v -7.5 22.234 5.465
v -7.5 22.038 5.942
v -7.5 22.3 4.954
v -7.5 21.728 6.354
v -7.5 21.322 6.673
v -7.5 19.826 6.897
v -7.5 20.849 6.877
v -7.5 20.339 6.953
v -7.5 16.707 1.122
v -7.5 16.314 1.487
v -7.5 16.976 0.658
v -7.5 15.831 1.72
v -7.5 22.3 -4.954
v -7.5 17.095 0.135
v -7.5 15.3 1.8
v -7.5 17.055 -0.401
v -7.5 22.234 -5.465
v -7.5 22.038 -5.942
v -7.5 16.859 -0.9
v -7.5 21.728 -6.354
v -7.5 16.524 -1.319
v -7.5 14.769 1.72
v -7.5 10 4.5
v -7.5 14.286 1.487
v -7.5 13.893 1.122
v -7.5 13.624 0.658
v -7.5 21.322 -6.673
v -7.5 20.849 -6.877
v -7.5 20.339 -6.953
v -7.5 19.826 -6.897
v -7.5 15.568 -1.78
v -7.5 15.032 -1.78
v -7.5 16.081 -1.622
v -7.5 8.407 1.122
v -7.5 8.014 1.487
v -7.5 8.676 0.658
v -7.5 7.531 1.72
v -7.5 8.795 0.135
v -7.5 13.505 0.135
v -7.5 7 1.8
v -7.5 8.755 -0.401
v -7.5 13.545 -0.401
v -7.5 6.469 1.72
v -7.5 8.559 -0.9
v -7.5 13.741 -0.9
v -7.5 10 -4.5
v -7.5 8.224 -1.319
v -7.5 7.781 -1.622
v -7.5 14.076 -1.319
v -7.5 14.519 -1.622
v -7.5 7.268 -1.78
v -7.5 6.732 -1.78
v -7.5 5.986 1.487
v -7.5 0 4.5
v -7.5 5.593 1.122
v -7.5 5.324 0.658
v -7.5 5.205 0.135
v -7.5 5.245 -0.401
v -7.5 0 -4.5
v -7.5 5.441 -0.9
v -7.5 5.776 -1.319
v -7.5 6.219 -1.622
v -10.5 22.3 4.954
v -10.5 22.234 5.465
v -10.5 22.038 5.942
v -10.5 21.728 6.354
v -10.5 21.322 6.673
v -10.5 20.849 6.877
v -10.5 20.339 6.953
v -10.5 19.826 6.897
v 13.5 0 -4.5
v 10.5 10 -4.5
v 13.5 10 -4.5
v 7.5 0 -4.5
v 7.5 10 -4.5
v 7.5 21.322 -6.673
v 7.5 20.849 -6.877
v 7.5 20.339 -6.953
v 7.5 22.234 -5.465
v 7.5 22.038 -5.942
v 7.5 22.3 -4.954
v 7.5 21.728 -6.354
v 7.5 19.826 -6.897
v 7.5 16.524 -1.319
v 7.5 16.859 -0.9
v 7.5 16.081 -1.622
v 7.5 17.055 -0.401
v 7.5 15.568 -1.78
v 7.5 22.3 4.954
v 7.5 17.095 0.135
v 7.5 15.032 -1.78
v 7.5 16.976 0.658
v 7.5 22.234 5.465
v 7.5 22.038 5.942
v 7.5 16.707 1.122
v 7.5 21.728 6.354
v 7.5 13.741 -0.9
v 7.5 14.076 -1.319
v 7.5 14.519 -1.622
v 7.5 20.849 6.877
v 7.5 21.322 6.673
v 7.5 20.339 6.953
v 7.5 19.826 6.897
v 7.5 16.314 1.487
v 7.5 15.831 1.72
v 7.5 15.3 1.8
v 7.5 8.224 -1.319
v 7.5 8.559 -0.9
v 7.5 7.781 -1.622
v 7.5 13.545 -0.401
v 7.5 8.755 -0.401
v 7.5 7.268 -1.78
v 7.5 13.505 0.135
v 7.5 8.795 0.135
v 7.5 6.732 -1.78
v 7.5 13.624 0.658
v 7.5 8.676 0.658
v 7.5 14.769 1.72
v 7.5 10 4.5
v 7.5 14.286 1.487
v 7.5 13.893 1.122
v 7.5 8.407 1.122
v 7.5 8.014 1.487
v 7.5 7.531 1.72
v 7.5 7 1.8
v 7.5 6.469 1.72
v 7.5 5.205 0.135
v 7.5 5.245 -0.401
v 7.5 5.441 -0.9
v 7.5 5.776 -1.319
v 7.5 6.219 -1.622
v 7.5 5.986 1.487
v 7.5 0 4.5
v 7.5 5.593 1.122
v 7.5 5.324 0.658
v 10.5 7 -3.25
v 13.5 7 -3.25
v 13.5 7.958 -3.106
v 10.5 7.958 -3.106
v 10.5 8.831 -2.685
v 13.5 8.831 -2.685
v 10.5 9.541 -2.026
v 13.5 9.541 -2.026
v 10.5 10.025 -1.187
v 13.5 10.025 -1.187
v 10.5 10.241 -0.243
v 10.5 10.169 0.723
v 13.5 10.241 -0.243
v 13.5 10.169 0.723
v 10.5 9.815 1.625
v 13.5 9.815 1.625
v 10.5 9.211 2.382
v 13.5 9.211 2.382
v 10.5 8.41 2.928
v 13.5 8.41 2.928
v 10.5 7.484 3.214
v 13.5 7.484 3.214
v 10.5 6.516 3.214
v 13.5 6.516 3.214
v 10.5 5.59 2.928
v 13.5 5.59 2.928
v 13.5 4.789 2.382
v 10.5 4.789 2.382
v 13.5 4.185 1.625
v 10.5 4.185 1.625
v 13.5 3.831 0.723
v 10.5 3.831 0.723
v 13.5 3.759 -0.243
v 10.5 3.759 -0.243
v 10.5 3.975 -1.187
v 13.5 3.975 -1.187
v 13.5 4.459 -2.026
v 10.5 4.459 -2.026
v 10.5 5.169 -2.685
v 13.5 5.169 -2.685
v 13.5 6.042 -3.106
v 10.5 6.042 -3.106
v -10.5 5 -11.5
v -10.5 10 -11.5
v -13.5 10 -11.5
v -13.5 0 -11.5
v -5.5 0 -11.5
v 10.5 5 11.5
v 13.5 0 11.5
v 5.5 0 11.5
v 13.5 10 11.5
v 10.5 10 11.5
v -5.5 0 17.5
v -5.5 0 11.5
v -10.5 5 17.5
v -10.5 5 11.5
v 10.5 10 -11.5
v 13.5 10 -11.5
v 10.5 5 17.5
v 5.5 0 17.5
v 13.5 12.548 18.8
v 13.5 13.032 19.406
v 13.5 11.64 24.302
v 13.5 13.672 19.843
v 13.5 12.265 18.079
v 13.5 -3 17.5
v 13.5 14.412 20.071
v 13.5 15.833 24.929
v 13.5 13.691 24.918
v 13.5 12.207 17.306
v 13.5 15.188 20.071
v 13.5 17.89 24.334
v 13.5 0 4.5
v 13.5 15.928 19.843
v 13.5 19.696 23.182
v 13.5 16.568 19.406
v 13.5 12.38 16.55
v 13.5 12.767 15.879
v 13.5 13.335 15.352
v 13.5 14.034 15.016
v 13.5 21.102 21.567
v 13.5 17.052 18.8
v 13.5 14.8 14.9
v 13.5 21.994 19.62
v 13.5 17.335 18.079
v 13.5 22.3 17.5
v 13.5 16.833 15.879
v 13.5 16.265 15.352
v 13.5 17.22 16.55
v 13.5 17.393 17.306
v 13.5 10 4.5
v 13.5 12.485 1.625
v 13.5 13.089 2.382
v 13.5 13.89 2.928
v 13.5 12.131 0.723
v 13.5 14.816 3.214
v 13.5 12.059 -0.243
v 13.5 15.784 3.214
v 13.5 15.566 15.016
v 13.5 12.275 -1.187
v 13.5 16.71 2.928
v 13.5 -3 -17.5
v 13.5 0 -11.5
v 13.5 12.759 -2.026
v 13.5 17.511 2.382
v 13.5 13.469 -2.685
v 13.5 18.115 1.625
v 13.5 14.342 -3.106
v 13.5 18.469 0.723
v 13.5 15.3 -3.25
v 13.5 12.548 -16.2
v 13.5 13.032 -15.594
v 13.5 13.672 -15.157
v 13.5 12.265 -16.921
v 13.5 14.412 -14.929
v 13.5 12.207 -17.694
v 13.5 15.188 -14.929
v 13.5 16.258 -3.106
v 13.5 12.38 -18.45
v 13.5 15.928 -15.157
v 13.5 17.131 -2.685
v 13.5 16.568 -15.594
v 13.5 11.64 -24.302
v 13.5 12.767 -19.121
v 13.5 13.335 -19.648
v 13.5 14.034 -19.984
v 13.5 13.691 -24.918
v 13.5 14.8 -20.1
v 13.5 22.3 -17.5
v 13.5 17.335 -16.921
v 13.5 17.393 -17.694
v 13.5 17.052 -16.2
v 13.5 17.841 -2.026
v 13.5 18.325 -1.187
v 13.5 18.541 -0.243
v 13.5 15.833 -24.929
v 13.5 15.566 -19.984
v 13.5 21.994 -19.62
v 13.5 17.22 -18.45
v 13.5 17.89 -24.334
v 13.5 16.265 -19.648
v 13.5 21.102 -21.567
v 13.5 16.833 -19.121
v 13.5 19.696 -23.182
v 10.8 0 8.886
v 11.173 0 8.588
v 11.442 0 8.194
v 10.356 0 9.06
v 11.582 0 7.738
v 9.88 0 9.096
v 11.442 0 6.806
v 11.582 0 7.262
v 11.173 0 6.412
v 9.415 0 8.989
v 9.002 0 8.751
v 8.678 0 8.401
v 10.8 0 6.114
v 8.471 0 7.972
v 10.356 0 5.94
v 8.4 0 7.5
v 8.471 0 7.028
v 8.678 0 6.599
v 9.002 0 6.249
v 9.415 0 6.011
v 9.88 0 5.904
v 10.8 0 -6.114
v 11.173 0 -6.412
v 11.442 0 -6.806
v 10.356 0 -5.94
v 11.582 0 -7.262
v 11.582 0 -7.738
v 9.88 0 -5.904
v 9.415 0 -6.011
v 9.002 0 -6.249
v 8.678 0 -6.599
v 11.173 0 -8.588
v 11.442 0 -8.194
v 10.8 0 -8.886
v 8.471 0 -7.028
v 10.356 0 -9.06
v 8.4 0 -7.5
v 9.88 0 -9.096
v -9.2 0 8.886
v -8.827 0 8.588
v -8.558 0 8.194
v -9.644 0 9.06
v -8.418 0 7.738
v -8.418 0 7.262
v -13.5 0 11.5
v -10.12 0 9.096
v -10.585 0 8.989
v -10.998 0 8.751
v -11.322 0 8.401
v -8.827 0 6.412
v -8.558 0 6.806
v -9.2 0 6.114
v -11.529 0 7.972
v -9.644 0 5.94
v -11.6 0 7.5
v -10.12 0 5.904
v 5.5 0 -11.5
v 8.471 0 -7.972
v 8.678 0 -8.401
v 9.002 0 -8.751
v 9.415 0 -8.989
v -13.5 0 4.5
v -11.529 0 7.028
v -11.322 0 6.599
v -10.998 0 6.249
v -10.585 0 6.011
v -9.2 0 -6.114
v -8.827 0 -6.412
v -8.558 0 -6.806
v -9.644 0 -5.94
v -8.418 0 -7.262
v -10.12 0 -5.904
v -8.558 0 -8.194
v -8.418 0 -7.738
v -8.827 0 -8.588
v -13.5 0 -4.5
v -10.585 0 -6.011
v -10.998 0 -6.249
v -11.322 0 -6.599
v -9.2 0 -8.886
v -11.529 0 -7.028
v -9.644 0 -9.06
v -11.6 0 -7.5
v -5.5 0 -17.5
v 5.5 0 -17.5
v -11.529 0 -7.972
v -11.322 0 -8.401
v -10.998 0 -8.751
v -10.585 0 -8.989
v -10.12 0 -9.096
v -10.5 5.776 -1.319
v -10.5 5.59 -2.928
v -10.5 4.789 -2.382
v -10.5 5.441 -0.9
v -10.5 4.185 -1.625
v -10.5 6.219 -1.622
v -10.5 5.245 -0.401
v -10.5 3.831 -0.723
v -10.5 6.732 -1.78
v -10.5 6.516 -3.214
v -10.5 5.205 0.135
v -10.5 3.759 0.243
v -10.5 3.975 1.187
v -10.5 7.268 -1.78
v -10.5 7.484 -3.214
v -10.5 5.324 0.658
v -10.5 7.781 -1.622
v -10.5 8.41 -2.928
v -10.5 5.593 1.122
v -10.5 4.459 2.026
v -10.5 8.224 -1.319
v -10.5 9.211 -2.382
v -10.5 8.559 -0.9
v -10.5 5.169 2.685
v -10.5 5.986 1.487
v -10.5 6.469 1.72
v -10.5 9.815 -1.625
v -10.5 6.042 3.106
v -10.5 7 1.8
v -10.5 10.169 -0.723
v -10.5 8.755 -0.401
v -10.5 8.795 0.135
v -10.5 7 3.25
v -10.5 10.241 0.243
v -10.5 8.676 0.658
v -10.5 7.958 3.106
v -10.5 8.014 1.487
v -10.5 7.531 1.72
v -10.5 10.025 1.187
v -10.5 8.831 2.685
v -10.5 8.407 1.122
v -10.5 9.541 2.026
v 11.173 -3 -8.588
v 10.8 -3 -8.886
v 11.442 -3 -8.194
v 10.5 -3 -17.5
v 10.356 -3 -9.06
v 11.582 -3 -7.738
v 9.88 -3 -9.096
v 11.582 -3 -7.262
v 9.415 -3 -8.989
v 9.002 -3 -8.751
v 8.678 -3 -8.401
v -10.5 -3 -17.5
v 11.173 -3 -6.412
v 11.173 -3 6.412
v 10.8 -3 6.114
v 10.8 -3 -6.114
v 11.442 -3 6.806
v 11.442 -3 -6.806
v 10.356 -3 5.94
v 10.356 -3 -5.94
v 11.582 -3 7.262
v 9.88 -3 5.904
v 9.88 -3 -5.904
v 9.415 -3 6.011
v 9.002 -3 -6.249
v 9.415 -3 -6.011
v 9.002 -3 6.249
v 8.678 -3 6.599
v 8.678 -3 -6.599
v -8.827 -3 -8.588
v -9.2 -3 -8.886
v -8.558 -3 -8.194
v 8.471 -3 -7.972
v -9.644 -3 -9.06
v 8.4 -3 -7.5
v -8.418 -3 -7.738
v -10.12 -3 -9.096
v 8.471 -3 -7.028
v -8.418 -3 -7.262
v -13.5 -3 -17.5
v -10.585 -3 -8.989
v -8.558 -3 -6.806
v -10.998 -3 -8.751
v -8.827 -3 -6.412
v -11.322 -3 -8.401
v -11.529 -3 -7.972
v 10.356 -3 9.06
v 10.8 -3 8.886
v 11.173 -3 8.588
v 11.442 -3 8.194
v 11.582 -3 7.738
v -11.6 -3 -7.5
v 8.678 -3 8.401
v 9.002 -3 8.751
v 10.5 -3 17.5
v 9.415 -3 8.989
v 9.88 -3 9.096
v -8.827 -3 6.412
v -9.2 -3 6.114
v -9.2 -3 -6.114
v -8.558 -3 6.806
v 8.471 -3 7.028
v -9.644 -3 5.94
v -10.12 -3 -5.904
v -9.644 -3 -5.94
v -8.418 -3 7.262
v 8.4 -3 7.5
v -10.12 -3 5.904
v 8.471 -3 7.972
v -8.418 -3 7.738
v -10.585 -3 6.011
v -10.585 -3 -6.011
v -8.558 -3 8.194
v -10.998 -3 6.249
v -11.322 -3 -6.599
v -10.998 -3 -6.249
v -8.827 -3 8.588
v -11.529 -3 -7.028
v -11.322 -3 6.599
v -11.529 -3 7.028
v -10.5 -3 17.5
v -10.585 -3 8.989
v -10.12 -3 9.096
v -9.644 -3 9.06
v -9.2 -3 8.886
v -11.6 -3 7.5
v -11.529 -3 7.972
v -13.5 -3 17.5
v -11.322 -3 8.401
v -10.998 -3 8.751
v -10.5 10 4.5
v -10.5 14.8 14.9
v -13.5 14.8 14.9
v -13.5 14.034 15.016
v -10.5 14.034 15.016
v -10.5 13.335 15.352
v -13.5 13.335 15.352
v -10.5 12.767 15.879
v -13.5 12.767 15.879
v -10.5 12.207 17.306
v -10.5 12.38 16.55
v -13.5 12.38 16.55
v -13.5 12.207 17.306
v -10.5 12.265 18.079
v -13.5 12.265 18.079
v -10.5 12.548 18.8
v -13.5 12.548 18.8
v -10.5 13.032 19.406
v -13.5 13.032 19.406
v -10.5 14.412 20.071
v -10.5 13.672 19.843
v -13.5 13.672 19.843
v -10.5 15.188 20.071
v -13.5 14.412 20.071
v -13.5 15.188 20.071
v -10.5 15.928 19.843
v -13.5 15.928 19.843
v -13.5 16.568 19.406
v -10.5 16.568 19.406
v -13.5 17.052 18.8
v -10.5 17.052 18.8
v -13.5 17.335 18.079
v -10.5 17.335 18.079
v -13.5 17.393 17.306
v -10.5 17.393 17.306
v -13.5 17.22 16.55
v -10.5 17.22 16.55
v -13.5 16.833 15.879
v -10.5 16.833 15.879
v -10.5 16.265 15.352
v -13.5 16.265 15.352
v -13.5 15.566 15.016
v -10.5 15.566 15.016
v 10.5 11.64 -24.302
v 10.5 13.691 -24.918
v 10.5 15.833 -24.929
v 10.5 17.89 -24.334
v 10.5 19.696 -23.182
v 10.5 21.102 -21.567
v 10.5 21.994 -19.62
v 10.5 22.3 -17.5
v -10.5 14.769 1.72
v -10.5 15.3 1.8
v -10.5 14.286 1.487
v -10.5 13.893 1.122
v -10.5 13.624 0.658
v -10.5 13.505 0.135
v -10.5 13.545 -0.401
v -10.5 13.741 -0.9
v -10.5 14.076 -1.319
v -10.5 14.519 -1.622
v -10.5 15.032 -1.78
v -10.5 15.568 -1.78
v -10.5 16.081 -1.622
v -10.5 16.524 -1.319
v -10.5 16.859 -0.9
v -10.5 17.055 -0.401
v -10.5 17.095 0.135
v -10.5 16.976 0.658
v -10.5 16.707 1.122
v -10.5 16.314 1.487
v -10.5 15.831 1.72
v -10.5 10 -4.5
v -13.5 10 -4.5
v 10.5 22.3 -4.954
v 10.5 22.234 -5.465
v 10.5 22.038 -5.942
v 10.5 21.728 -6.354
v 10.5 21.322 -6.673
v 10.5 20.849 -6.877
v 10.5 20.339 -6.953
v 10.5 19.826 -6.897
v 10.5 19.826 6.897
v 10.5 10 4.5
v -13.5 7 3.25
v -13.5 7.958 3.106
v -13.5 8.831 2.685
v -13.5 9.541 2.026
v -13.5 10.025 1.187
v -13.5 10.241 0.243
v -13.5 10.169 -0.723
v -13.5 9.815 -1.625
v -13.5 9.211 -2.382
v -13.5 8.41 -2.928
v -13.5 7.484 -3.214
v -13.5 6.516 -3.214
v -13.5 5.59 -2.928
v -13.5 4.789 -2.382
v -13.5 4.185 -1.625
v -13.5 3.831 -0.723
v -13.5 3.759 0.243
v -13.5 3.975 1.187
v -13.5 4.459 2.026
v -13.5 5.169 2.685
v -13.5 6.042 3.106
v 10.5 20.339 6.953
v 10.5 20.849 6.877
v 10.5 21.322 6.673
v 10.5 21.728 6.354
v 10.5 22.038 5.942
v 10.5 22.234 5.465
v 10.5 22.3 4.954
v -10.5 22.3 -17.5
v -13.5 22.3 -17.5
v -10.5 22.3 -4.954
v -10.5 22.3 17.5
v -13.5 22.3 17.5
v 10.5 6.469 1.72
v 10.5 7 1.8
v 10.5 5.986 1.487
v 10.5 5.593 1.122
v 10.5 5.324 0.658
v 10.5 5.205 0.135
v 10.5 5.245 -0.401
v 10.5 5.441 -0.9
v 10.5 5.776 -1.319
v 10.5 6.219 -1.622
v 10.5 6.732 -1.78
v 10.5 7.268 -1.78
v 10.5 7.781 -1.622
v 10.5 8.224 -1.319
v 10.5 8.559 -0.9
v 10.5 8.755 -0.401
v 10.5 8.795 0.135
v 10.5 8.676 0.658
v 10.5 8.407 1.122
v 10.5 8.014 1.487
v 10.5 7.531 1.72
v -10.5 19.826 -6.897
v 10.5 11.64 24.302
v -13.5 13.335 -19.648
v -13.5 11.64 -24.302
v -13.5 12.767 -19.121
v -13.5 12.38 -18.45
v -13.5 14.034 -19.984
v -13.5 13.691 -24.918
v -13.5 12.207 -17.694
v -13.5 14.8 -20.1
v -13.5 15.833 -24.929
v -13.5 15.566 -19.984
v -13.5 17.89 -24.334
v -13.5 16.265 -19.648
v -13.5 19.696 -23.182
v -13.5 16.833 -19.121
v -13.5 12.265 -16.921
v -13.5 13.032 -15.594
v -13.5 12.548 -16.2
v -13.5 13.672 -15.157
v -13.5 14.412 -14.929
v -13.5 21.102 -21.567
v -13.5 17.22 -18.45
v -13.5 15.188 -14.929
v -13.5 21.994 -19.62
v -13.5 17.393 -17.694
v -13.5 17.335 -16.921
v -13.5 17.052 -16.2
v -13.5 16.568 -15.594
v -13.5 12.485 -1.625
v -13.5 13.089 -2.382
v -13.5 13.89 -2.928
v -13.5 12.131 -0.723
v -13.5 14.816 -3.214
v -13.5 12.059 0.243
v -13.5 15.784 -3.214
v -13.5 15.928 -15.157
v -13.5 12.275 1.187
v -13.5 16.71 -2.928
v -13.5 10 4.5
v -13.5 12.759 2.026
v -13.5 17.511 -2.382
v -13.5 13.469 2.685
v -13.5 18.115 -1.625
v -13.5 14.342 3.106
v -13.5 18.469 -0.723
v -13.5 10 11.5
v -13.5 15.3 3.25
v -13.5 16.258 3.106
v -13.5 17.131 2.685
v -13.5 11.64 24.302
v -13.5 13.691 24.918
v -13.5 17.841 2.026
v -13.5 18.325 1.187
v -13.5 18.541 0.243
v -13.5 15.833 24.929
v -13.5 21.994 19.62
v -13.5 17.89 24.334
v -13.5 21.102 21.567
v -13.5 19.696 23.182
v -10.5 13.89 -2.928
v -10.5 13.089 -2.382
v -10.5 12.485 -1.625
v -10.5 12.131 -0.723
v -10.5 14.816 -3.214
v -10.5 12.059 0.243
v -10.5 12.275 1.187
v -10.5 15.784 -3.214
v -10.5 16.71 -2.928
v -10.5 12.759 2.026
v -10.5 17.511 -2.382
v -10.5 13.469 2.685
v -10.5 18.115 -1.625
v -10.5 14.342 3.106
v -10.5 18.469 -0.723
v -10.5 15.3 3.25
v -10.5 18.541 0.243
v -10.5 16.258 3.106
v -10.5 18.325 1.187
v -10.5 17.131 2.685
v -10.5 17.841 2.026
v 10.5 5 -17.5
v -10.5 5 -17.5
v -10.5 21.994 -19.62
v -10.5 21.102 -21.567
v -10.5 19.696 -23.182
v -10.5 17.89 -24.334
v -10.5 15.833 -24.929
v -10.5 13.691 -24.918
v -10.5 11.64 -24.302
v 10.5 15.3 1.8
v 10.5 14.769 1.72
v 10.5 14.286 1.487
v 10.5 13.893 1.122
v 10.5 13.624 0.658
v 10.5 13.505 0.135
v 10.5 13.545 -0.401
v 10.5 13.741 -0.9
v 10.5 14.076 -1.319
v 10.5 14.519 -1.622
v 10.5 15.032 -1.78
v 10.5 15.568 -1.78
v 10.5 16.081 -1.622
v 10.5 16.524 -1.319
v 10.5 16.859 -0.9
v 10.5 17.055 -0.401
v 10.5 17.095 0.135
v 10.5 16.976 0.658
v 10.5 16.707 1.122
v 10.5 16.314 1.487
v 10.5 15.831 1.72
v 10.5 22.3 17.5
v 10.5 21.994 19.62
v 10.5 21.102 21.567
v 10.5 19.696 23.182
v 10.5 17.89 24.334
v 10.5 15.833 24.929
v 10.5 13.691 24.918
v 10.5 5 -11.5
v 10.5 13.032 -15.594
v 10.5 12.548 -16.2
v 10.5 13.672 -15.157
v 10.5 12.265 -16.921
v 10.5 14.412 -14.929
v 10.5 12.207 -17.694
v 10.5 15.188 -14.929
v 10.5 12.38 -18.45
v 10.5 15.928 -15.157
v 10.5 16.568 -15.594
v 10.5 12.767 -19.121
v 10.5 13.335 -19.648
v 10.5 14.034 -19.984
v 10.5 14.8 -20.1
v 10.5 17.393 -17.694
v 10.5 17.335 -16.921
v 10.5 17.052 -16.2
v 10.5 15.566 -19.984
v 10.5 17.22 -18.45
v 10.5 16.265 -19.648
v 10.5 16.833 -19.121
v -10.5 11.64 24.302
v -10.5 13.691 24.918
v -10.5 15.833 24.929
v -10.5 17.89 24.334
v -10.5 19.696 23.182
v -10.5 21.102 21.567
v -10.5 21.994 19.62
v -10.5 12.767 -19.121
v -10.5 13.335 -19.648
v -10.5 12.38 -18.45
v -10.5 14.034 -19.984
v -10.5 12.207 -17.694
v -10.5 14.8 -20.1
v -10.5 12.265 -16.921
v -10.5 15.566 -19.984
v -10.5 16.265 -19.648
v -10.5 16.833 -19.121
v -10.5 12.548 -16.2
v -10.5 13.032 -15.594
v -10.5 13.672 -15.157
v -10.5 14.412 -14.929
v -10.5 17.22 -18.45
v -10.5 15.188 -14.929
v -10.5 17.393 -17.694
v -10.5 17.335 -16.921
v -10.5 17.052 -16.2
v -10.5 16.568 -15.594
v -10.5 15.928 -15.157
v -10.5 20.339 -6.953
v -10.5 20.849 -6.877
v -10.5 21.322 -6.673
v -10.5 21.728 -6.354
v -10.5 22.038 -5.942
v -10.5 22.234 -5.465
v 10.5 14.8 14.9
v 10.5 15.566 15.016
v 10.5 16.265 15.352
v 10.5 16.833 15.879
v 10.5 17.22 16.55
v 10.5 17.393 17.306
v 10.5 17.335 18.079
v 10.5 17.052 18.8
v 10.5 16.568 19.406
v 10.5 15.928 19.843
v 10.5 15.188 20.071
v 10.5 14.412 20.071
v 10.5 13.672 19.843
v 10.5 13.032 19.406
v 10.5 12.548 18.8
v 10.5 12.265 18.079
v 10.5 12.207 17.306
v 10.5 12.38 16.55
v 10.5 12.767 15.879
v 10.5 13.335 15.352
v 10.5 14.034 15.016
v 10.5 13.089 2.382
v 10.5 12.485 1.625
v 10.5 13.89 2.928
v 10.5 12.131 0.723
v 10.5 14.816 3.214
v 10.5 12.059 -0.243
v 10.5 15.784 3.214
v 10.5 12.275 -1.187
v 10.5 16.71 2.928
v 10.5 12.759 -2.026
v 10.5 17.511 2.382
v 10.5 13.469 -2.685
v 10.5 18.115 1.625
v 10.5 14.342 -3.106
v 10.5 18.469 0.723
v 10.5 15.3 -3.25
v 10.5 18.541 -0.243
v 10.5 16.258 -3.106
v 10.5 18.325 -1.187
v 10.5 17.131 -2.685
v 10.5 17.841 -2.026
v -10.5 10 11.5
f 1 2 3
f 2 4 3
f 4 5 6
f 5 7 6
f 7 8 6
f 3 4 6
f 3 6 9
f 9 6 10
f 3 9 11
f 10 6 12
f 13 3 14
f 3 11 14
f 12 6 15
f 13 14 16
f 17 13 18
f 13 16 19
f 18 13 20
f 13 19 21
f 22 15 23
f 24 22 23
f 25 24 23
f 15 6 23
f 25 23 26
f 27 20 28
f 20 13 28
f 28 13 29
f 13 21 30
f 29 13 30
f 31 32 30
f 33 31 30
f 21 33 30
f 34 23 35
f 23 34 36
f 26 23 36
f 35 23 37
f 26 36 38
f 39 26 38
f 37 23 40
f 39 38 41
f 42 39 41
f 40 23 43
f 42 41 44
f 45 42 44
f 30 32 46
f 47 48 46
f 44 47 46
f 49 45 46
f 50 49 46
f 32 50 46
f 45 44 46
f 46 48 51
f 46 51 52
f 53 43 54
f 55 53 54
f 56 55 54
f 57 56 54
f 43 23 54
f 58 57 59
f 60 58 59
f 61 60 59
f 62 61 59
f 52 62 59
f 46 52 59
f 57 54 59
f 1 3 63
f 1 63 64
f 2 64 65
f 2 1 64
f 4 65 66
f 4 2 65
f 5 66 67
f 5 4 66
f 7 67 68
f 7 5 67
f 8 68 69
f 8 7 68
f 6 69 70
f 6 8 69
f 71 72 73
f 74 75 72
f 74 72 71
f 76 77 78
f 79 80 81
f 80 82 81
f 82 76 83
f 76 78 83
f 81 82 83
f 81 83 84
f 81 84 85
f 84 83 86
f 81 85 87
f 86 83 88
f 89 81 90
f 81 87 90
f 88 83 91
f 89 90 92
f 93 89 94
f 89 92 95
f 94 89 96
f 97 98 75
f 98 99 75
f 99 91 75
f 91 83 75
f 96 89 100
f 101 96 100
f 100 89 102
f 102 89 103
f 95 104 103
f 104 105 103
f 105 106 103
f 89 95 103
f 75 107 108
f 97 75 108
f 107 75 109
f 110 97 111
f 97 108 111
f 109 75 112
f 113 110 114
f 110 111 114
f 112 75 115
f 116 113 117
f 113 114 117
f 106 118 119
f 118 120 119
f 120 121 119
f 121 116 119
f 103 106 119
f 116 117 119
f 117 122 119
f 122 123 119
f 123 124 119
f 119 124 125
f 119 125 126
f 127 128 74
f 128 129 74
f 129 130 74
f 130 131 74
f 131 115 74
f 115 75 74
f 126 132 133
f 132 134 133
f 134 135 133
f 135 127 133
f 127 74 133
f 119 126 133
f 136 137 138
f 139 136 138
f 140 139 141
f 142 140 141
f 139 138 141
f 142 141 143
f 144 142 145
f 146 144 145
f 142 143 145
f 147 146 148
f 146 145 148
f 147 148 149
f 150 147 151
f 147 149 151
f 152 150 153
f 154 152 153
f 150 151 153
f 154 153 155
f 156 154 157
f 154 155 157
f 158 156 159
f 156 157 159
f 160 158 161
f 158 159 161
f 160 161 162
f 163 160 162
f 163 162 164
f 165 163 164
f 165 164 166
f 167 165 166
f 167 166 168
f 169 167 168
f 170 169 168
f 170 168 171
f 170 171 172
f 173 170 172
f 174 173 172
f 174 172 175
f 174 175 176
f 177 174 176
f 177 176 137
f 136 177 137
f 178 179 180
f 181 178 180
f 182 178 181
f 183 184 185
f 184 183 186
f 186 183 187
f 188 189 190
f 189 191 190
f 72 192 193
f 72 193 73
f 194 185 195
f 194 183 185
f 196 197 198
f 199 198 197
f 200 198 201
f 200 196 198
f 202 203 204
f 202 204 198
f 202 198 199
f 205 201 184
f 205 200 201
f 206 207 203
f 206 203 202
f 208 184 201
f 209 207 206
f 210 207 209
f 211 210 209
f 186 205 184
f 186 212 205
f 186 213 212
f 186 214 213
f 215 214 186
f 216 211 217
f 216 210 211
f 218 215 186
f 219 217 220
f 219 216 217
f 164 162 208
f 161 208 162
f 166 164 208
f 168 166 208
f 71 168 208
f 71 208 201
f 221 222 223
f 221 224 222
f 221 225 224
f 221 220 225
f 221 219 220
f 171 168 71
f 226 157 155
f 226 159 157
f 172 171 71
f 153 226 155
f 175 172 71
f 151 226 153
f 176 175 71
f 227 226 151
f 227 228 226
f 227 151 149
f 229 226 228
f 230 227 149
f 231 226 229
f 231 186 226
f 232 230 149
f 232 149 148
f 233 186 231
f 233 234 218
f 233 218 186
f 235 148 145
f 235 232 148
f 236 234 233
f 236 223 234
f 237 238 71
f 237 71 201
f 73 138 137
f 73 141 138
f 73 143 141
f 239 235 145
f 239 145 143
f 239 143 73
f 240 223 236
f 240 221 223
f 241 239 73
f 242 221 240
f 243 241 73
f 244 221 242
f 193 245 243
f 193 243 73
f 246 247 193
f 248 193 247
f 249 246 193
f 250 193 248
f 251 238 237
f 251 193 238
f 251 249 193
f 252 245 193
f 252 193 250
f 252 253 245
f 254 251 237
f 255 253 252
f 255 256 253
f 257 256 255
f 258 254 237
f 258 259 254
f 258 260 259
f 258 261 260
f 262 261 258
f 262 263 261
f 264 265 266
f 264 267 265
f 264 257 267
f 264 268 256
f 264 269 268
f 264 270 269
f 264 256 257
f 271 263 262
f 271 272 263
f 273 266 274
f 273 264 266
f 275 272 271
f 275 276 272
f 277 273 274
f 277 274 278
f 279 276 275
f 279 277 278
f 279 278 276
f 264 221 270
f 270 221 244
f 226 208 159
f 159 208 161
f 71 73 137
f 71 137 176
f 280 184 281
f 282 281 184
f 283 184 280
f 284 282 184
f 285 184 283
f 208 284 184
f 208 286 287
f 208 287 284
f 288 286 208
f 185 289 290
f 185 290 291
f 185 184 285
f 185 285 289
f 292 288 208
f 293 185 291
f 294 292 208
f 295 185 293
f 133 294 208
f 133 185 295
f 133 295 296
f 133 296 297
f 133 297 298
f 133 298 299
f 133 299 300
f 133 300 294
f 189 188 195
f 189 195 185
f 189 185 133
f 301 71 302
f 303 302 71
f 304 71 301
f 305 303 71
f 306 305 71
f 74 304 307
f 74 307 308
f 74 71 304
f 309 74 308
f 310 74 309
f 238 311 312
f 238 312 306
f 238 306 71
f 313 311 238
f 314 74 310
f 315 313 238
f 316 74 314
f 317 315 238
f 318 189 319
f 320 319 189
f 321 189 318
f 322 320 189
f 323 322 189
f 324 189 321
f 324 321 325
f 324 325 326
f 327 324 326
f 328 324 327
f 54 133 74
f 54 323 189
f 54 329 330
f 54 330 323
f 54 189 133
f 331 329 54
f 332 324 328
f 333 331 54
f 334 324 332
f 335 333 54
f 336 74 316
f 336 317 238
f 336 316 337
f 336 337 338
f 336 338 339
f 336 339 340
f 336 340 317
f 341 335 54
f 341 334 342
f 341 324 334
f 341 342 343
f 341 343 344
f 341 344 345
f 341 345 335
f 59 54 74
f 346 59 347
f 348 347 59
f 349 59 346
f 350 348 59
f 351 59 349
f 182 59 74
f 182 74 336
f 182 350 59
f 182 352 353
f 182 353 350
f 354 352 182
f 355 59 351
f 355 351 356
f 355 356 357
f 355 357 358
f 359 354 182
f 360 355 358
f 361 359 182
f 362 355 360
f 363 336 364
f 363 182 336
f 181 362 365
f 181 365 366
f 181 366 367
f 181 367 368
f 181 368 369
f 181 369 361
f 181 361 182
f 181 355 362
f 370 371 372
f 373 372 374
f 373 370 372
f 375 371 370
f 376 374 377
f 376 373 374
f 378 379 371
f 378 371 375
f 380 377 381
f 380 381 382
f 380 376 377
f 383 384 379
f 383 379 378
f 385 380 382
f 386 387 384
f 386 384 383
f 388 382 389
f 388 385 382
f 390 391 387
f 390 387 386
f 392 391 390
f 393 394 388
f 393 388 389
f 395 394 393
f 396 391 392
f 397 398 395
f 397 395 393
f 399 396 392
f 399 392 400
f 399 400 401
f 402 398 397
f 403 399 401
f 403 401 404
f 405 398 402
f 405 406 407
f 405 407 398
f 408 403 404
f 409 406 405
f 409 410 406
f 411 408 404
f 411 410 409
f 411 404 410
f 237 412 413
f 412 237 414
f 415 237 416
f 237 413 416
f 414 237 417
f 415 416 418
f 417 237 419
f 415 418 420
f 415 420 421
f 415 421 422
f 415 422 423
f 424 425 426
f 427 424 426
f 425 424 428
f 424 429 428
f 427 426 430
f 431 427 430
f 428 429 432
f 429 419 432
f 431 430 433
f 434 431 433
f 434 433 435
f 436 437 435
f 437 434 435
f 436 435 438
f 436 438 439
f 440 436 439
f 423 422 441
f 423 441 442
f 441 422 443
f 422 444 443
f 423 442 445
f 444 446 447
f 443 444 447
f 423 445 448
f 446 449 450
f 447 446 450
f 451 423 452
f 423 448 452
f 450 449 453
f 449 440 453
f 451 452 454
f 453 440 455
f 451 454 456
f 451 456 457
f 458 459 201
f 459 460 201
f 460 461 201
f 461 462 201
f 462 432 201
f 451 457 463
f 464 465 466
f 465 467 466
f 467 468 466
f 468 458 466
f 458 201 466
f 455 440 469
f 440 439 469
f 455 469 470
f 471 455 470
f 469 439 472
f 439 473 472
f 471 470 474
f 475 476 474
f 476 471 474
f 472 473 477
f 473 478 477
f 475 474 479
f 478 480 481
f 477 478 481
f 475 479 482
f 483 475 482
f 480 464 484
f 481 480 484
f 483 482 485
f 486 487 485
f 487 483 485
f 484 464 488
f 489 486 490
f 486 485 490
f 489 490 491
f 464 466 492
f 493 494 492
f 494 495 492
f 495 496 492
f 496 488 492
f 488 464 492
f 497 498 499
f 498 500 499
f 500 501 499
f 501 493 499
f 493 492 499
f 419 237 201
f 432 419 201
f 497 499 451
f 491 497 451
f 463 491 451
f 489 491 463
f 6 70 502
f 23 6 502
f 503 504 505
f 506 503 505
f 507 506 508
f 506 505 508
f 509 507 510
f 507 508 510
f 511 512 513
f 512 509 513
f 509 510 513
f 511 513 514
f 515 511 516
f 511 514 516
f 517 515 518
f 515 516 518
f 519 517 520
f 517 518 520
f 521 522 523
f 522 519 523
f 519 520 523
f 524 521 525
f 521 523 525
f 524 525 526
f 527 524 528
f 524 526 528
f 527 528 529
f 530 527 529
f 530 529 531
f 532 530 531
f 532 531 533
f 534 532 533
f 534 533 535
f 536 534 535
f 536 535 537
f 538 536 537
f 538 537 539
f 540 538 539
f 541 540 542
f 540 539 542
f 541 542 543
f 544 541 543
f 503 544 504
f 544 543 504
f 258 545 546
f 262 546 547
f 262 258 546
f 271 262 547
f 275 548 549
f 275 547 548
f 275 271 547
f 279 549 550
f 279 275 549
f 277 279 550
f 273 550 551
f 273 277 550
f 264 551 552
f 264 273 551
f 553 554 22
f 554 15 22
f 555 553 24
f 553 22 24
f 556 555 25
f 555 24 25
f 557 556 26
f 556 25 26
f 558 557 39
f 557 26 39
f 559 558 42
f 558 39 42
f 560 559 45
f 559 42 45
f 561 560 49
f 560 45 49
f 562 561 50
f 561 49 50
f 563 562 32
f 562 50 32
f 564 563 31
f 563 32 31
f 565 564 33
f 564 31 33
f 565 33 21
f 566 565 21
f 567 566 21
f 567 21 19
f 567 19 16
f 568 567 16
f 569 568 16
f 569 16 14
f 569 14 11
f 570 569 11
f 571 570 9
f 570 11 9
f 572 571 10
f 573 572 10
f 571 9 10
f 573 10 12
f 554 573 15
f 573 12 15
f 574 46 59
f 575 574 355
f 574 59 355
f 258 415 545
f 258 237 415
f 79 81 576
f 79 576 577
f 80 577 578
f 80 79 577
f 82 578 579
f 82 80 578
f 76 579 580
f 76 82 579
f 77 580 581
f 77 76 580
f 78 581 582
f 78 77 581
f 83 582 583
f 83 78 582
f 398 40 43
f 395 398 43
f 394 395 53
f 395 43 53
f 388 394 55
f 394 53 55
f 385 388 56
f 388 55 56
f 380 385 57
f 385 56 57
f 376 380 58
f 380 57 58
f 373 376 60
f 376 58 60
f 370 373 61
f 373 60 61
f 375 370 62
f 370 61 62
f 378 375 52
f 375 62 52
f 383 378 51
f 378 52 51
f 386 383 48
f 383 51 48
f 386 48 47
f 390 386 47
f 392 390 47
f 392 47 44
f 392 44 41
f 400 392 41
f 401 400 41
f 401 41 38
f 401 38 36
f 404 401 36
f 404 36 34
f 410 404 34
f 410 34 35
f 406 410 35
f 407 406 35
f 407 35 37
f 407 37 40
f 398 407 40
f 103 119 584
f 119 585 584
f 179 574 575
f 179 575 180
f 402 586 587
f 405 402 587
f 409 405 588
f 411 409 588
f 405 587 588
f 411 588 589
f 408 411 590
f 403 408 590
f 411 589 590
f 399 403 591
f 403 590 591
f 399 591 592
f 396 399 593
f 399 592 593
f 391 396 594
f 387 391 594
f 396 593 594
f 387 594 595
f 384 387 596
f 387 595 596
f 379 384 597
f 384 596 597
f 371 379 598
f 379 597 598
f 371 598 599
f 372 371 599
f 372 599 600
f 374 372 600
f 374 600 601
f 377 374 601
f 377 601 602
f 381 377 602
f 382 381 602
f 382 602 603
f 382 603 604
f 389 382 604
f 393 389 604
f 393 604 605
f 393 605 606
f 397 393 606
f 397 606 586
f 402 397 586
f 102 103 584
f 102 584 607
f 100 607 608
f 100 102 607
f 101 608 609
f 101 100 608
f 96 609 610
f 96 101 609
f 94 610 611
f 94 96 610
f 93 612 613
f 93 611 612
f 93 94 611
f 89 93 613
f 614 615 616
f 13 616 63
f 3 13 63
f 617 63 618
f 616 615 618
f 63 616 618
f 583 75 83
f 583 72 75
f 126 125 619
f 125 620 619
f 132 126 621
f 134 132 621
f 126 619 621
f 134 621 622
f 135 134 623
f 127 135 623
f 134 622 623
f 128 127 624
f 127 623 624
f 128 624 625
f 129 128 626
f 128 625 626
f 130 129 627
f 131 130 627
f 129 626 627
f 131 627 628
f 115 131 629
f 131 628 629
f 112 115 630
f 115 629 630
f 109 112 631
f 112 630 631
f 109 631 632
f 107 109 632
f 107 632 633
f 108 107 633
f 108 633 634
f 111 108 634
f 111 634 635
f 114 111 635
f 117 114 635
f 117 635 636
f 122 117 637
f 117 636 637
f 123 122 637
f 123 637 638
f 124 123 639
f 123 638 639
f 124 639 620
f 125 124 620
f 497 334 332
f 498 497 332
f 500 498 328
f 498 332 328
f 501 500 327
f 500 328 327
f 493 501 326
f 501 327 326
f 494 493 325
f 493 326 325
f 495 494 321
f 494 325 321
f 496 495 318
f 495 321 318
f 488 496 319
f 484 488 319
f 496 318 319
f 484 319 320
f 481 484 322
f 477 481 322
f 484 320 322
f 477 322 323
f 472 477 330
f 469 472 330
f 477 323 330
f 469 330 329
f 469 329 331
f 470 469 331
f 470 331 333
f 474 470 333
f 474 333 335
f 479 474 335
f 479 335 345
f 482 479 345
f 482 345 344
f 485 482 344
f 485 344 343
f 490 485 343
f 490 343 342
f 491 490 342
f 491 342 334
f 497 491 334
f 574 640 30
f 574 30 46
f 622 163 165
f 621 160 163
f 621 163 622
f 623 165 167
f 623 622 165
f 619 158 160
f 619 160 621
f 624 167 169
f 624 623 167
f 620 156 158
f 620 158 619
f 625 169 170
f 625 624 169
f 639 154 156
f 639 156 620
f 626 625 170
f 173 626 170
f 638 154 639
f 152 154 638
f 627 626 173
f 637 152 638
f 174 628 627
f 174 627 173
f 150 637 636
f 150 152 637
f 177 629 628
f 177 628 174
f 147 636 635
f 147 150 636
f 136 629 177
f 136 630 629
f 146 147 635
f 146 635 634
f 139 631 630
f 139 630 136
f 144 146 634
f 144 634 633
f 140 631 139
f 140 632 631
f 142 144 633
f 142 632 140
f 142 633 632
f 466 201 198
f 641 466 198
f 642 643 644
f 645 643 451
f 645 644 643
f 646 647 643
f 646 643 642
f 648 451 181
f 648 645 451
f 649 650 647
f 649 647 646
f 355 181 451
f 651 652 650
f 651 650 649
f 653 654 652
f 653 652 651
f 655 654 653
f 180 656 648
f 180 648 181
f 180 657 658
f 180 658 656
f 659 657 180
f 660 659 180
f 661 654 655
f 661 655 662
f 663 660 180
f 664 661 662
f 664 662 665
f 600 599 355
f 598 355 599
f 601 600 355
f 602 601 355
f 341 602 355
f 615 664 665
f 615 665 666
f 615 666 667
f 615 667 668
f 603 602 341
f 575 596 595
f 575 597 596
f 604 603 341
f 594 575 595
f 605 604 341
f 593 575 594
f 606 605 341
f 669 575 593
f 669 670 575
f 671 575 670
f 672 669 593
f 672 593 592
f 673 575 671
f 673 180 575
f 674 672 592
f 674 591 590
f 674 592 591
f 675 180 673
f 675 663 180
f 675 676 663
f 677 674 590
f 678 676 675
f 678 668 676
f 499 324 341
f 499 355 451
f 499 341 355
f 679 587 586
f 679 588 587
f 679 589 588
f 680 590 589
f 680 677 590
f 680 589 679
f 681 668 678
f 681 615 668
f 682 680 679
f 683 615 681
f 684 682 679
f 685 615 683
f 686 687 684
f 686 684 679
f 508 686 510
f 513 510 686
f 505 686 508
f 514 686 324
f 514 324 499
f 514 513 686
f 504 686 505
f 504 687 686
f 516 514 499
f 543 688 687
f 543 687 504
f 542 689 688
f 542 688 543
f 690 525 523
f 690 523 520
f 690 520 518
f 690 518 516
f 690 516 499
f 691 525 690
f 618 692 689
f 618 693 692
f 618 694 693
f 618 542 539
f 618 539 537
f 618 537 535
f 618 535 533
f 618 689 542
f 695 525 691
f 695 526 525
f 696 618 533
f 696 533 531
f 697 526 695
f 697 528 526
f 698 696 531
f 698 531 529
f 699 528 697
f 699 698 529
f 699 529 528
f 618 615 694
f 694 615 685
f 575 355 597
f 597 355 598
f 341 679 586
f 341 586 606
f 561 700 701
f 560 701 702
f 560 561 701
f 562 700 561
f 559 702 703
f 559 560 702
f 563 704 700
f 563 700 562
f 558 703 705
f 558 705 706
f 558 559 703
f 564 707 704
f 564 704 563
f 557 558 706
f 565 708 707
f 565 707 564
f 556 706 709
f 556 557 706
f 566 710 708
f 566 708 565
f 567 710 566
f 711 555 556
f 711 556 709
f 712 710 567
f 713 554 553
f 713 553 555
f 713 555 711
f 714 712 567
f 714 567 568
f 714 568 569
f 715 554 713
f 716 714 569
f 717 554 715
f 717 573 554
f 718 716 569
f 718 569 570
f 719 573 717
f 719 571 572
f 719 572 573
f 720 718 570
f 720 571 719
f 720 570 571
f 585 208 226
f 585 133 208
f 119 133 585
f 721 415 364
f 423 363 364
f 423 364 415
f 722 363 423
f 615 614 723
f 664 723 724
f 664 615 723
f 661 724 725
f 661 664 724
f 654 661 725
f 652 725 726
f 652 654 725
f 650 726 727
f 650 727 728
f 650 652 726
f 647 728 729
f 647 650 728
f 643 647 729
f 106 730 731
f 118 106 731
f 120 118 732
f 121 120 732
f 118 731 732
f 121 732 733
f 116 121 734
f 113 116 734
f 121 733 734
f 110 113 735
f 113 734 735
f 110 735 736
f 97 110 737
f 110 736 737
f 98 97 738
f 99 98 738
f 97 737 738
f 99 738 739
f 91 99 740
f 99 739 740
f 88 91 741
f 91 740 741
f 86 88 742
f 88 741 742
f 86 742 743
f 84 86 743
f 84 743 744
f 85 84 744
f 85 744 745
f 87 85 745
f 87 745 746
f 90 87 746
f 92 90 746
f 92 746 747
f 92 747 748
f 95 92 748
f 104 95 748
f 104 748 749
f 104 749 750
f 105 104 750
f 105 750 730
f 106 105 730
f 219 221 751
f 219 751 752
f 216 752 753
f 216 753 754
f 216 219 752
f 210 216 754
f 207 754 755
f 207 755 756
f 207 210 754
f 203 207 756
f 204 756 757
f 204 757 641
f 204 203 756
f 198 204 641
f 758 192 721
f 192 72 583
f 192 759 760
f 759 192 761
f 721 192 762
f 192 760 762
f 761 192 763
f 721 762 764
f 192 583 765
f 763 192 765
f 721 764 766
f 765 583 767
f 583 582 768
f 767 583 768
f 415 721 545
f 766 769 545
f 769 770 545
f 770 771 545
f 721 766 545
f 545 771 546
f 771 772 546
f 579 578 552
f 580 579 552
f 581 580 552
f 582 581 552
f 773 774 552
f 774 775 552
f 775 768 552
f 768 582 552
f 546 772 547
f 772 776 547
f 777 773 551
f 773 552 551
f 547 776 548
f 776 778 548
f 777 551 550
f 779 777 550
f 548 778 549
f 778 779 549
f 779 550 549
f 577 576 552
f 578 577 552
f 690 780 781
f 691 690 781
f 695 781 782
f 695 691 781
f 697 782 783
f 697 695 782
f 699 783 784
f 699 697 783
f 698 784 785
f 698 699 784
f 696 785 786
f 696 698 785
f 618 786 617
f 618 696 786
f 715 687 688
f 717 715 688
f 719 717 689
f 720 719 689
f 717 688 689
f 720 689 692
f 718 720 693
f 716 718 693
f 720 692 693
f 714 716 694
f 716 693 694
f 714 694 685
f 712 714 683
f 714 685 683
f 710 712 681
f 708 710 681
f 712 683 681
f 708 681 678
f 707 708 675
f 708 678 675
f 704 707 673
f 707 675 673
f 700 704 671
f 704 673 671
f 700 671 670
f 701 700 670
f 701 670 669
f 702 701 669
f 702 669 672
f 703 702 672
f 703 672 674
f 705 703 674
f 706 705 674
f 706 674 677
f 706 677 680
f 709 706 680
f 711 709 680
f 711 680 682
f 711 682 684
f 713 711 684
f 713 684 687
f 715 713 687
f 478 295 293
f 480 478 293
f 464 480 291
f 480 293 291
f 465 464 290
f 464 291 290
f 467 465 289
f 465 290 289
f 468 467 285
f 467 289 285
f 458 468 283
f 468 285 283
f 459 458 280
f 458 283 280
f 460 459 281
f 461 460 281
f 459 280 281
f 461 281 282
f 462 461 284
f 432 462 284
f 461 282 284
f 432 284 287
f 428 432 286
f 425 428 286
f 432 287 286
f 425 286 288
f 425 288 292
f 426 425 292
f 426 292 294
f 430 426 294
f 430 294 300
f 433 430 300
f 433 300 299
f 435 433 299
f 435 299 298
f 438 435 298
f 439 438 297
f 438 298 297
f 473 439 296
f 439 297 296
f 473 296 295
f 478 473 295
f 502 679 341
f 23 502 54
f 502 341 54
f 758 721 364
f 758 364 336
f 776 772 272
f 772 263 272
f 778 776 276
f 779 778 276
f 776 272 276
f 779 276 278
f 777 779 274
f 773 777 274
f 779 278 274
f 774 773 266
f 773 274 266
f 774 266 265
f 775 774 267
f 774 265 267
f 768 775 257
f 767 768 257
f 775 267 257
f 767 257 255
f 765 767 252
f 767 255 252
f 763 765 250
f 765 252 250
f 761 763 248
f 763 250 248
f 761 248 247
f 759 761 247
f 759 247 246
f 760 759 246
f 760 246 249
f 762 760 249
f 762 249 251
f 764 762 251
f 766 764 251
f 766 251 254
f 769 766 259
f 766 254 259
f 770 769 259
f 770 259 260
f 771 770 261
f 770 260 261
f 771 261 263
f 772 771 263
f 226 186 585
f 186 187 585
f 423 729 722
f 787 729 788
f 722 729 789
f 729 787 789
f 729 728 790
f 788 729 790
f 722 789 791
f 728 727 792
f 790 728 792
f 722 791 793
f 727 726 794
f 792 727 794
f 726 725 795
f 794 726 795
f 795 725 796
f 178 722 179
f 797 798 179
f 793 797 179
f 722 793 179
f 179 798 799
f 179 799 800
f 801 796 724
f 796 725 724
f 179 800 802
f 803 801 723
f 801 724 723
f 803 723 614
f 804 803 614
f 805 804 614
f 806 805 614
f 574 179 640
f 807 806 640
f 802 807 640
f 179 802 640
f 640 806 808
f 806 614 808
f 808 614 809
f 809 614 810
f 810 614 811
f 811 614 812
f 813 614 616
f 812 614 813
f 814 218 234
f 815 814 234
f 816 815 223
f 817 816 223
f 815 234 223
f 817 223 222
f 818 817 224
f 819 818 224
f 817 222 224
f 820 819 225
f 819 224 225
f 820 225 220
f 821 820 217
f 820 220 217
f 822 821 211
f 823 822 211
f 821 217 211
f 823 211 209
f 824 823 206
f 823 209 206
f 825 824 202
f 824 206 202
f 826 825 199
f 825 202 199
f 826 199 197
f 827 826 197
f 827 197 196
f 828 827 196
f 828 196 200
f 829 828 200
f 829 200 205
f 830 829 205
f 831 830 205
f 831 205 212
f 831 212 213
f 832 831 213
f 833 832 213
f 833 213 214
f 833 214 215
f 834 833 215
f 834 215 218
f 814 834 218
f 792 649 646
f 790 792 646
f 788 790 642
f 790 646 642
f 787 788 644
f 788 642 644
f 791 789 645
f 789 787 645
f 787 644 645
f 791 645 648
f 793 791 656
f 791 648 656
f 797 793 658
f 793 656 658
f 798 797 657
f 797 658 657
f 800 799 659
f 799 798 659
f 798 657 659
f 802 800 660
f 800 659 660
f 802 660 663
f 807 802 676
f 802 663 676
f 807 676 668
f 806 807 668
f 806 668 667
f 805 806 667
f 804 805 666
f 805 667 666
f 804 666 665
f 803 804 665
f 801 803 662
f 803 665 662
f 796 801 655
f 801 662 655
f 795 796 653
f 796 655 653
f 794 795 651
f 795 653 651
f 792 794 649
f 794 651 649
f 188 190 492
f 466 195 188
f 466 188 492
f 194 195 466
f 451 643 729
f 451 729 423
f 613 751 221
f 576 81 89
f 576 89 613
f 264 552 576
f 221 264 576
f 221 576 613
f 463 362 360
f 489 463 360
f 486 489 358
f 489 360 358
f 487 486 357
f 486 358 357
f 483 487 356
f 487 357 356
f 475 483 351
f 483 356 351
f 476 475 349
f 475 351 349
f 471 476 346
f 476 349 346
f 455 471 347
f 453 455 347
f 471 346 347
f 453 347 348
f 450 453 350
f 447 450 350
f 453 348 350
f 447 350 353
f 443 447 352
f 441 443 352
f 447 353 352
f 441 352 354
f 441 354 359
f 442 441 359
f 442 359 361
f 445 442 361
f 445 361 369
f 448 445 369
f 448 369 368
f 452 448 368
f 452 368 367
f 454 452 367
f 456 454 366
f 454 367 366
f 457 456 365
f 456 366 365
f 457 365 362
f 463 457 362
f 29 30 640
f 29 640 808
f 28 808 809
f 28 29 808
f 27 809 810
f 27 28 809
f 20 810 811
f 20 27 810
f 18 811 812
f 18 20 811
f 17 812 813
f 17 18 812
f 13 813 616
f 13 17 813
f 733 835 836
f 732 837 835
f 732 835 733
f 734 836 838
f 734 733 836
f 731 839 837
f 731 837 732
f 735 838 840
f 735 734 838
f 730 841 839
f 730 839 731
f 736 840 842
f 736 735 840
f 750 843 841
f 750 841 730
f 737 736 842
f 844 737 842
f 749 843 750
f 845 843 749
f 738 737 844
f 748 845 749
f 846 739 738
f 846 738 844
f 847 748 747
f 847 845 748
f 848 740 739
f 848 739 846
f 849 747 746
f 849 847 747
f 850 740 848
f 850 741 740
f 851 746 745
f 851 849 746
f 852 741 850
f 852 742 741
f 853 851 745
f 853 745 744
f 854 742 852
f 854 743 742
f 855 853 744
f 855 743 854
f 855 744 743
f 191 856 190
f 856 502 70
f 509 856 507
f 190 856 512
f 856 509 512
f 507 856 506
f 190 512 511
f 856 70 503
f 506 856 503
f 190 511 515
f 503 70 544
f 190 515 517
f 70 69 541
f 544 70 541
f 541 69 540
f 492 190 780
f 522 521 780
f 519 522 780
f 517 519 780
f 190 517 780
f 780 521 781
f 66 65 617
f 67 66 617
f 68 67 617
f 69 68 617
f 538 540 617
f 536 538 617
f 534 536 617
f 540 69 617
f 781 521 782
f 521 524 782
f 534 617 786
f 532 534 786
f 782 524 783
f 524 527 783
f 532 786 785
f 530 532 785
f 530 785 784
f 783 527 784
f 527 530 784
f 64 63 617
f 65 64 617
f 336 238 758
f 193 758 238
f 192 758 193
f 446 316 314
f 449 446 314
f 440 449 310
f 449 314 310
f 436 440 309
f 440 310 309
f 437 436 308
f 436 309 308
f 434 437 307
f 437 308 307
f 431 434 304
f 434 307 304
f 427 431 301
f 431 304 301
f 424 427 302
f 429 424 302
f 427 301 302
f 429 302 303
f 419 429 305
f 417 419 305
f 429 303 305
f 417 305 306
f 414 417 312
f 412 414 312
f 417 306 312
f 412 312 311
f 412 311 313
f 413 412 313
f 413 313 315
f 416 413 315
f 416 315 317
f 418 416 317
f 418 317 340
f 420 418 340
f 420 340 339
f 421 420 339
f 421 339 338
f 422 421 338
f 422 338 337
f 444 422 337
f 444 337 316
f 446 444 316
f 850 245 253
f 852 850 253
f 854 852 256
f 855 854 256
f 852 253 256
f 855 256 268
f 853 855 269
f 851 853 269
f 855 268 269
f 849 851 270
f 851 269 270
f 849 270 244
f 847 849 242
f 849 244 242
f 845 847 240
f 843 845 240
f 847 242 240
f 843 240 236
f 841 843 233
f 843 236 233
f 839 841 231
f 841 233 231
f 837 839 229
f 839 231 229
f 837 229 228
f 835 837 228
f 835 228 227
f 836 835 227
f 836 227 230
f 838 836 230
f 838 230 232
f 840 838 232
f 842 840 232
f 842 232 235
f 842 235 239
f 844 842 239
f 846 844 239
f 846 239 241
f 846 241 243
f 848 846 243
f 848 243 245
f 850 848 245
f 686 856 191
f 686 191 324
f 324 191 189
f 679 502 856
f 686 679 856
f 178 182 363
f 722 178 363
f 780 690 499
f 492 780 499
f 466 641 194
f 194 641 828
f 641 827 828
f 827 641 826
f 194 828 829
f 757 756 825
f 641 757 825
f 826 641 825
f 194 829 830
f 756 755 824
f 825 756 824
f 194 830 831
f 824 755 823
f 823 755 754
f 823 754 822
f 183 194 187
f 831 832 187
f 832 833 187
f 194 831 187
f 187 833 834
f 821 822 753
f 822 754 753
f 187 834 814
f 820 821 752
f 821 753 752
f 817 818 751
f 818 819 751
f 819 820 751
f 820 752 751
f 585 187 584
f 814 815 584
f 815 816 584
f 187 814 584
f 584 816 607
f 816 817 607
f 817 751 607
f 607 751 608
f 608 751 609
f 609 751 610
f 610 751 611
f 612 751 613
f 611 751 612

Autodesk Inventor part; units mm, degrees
ref_plane "YZ Plane" through (0, 0, 0) normal (1, 0, 0) x (0, 1, 0)
ref_plane "XZ Plane" through (0, 0, 0) normal (0, 1, 0) x (-1, 0, 0)
ref_plane "XY Plane" through (0, 0, 0) normal (0, 0, 1) x (1, 0, 0)
sketch "Sketch8" plane through (0, 0, 0) normal (0, 1, 0) x (-1, 0, 0)
  line L0 (-13.5, -17.5) -> (13.5, -17.5)
  line L1 (13.5, -17.5) -> (13.5, 17.5)
  line L2 (13.5, 17.5) -> (-13.5, 17.5)
  line L3 (-13.5, 17.5) -> (-13.5, -17.5)
  line L4 (-13.5, -17.5) -> (13.5, 17.5) construction
  line L5 (13.5, -17.5) -> (-13.5, 17.5) construction
  circle A0 centre (10, -7.5) radius 1.6
  circle A1 centre (10, 7.5) radius 1.6
  circle A2 centre (-10, 7.5) radius 1.6
  circle A3 centre (-10, -7.5) radius 1.6
  point P0 (0, 0)
  dimension "d38" = 35
  dimension "d39" = 27
  dimension "d40" = 20
  dimension "d41" = 15
  dimension "d42" = 7.5
  dimension "d43" = 10
  dimension "d44" = 3.2
extrude "Extrusion7" add sketch "Sketch8" against normal blind 3
sketch "Sketch14" plane through (0, 0, 0) normal (0, 1, 0) x (1, 0, 0)
  line L0 (-13.5, 17.5) -> (-13.5, -17.5) projected
  line L1 (-13.5, -17.5) -> (13.5, -17.5) projected
  line L2 (13.5, -17.5) -> (13.5, 17.5) projected
  line L3 (13.5, 17.5) -> (-13.5, 17.5) projected
  circle A0 centre (-10, 7.5) radius 1.6 projected
  circle A1 centre (-10, -7.5) radius 1.6 projected
  circle A2 centre (10, -7.5) radius 1.6 projected
  circle A3 centre (10, 7.5) radius 1.6 projected
  line L4 (13.5, -17.5) -> (13.5, 17.5) projected
  line L5 (13.5, 4.5) -> (7.5, 4.5)
  line L6 (7.5, 4.5) -> (7.5, -4.5)
  line L7 (7.5, -4.5) -> (13.5, -4.5)
  line L8 (13.5, -4.5) -> (13.5, 4.5)
  point P0 (0, 0)
  dimension "d79" = 7.5
  dimension "d80" = 3
  dimension "d81" = 3
extrude "Extrusion12" add sketch "Sketch14" along normal blind 22.3 contours L2 L7 L6 L5
sketch "Sketch15" plane through (13.5, -3, 17.5) normal (1, 0, 0) x (0, 0, -1)
  line L0 (0, 3) -> (13, 3) projected
  line L1 (0, 3) -> (0, 0) projected
  line L2 (35, 0) -> (0, 0) projected
  line L3 (35, 3) -> (35, 0) projected
  line L4 (22, 3) -> (35, 3) projected
  line L5 (22, 3) -> (22, 25.3) projected
  line L6 (13, 25.3) -> (22, 25.3) projected
  line L7 (13, 3) -> (13, 25.3) projected
  line L8 (35, 3) -> (35, 0) projected
  line L9 (35, 0) -> (41.8017, 14.6399)
  circle A0 centre (35, 17.8) radius 2.6
  circle A1 centre (35, 17.8) radius 7.5
  circle A2 centre (0, 17.8) radius 2.6
  circle A3 centre (0, 17.8) radius 7.5
  line L10 (-275, -9) -> (225, -9) projected
  line L11 (0, 0) -> (-6.8017, 14.6399)
  line L12 (0, 25.3) -> (35, 25.3)
  point P0 (17.5, 3)
  point P1 (13, 25.3)
  point P2 (22, 25.3)
  dimension "d84" = 5.2
  dimension "d85" = 35
  dimension "d86" = 17.5
  dimension "d87" = 26.8
  dimension "d88" = 15
extrude "Extrusion13" add sketch "Sketch15" against normal blind 3 contours L1 L11 A3 L12 L7 L0 | L3 L4 L5 L12 A1 L9 | A3 | A1
sketch "Sketch16" plane through (10.5, -3, 17.5) normal (-1, 0, 0) x (0, 0, 1)
  arc A0 (-35, 25.3) -> (-41.8017, 14.6399) centre (-35, 17.8) ccw projected
  line L0 (-41.8017, 14.6399) -> (-35, 0) projected
  line L1 (-35, 3) -> (-35, 0) projected
  line L2 (-26.5199, 3) -> (-35, 3) projected
  line L3 (-26.5199, 3) -> (-23.4801, 3) projected
  line L4 (-22, 3) -> (-23.4801, 3) projected
  line L5 (-22, 25.3) -> (-22, 3) projected
  line L6 (-22, 25.3) -> (-35, 25.3) projected
  circle A1 centre (-35, 17.8) radius 2.6 projected
  arc A2 (6.8017, 14.6399) -> (0, 25.3) centre (0, 17.8) ccw projected
  line L7 (0, 25.3) -> (-13, 25.3) projected
  line L8 (-13, 3) -> (-13, 25.3) projected
  line L9 (-11.5199, 3) -> (-13, 3) projected
  line L10 (-11.5199, 3) -> (-8.4801, 3) projected
  line L11 (0, 3) -> (-8.4801, 3) projected
  line L12 (0, 0) -> (0, 3) projected
  line L13 (0, 0) -> (6.8017, 14.6399) projected
  circle A3 centre (0, 17.8) radius 2.6 projected
  line L14 (-22, 3) -> (-29, 3)
  line L15 (-29, 3) -> (-29, 13)
  line L16 (-29, 13) -> (-22, 13)
  line L17 (-22, 13) -> (-22, 3)
  line L18 (-11.5199, 3) -> (-13, 3) projected
  line L19 (-13, 3) -> (-6, 3)
  line L20 (-6, 3) -> (-6, 13)
  line L21 (-6, 13) -> (-13, 13)
  line L22 (-13, 13) -> (-13, 3)
  line L23 (-23.4, 0) -> (-26.6, 0) projected
  line L24 (-26.6, 3) -> (-23.4, 3) projected
  line L25 (-8.4, 0) -> (-11.6, 0) projected
  line L26 (-11.6, 3) -> (-8.4, 3) projected
  point P0 (-17.5, 3)
  point P1 (-10, 0)
  point P2 (-6, 3)
  dimension "d91" = 7
  dimension "d92" = 3
  dimension "d93" = 10
extrude "Extrusion14" cut sketch "Sketch16" against normal blind 22.3 contours L5 L4 L3 L2 L15 L16 | L21 L20 L11 L10 L9 L8
sketch "Sketch17" plane through (10.5, -3, 17.5) normal (-1, 0, 0) x (0, 0, 1)
  circle A0 centre (-35, 17.8) radius 2.6 projected
  line L0 (-29, 3) -> (-29, 13) projected
  line L1 (-29, 13) -> (-22, 13) projected
  line L2 (-22, 25.3) -> (-22, 13) projected
  line L3 (-22, 25.3) -> (-35, 25.3) projected
  arc A1 (-35, 25.3) -> (-41.8017, 14.6399) centre (-35, 17.8) ccw projected
  line L4 (-41.8017, 14.6399) -> (-35, 0) projected
  line L5 (-35, 3) -> (-35, 0) projected
  line L6 (-29, 3) -> (-35, 3) projected
  circle A2 centre (0, 17.8) radius 2.6 projected
  line L7 (-13, 13) -> (-6, 13) projected
  line L8 (-6, 13) -> (-6, 3) projected
  line L9 (0, 3) -> (-6, 3) projected
  line L10 (0, 0) -> (0, 3) projected
  line L11 (0, 0) -> (6.8017, 14.6399) projected
  arc A3 (6.8017, 14.6399) -> (0, 25.3) centre (0, 17.8) ccw projected
  line L12 (0, 25.3) -> (-13, 25.3) projected
  line L13 (-13, 13) -> (-13, 25.3) projected
  line L14 (-13, 13) -> (-10, 25.3)
  line L15 (-22, 13) -> (-25, 25.3)
  line L16 (-35, 25.3) -> (0, 25.3) projected
  point P0 (-17.5, 3)
  dimension "d96" = 15
extrude "Extrusion15" add sketch "Sketch17" along normal up to surface (3 mm away) contours L12 L14 L13 | L15 L3 L2
fillet "Fillet2" radius 2 2 edges at (9, 22.3, -7.5) (9, 22.3, 7.5)
mirror "Mirror1" about plane through (0, 0, 0) normal (1, 0, 0) of "Extrusion12", "Extrusion13", "Extrusion14", "Extrusion15", "Fillet2"
chamfer "Chamfer1" distance 5 angle 45 4 edges at (-10.5, 0, 14.5) (-10.5, 0, -14.5) (10.5, 0, 14.5) (10.5, 0, -14.5)
sketch "Sketch18" plane through (-13.5, 22.3, -17.5) normal (-1, 0, 0) x (0, 0, 1)
  line L0 (13, -22.3) -> (6, -22.3) projected
  line L1 (6, -22.3) -> (6, -12.3) projected
  line L2 (6, -12.3) -> (13, -12.3) projected
  line L3 (13, -12.3) -> (13, -22.3) projected
  line L4 (29, -22.3) -> (22, -22.3) projected
  line L5 (22, -22.3) -> (22, -12.3) projected
  line L6 (22, -12.3) -> (29, -12.3) projected
  line L7 (29, -12.3) -> (29, -22.3) projected
  circle A0 centre (0, -7.5) radius 2.6 projected
  circle A1 centre (35, -7.5) radius 2.6 projected
  line L8 (41.8017, -10.6601) -> (35, -25.3) projected
  arc A2 (41.8017, -10.6601) -> (35, 0) centre (35, -7.5) ccw projected
  line L9 (0, 0) -> (35, 0) projected
  arc A3 (0, 0) -> (-6.8017, -10.6601) centre (0, -7.5) ccw projected
  line L10 (0, -25.3) -> (-6.8017, -10.6601) projected
  line L11 (35, -25.3) -> (0, -25.3) projected
  point P0 (17.5, -22.3)
  point P1 (17.5, -7)
  point P2 (17.5, -15.3)
  dimension "d103" = 7
  dimension "d104" = 10
hole "Hole3" at (-13.5, 15.3, 0) at (-13.5, 7, 0) direction (1, 0, 0) diameter 3.6 end through all clearance for "Slotted Cheese Head Screw ISO 1207" size "M3" standard "ISO"
sketch "Sketch19" plane through (13.5, 22.3, 17.5) normal (1, 0, 0) x (0, 0, -1)
  circle A0 centre (17.5, -15.3) radius 1.8 projected
  circle A1 centre (17.5, -7) radius 1.8 projected
  circle A2 centre (17.5, -15.3) radius 3.25
  circle A3 centre (17.5, -7) radius 3.25
  point P0 (17.5, -22.3)
  dimension "d112" = 6.5
extrude "Extrusion16" cut sketch "Sketch19" against normal blind 3 contours A0 | A1 | A2 | A3
sketch "Sketch20" plane through (-13.5, 22.3, -17.5) normal (-1, 0, 0) x (0, 0, 1)
  circle A0 centre (17.5, -15.3) radius 3.25 projected
  circle A1 centre (17.5, -7) radius 3.25 projected
  point P0 (17.5, -22.3)
extrude "Extrusion17" cut sketch "Sketch20" against normal blind 3
equation "\"d42\" = 0.5 * d41"
equation "\"d43\" = 0.5 * d40"
equation "\"d81\" = d80"
equation "\"d86\" = 0.5 * d85"
properties part number "Y Axis Gantry Baseblock (CNC)" material "ABS Plastic"
